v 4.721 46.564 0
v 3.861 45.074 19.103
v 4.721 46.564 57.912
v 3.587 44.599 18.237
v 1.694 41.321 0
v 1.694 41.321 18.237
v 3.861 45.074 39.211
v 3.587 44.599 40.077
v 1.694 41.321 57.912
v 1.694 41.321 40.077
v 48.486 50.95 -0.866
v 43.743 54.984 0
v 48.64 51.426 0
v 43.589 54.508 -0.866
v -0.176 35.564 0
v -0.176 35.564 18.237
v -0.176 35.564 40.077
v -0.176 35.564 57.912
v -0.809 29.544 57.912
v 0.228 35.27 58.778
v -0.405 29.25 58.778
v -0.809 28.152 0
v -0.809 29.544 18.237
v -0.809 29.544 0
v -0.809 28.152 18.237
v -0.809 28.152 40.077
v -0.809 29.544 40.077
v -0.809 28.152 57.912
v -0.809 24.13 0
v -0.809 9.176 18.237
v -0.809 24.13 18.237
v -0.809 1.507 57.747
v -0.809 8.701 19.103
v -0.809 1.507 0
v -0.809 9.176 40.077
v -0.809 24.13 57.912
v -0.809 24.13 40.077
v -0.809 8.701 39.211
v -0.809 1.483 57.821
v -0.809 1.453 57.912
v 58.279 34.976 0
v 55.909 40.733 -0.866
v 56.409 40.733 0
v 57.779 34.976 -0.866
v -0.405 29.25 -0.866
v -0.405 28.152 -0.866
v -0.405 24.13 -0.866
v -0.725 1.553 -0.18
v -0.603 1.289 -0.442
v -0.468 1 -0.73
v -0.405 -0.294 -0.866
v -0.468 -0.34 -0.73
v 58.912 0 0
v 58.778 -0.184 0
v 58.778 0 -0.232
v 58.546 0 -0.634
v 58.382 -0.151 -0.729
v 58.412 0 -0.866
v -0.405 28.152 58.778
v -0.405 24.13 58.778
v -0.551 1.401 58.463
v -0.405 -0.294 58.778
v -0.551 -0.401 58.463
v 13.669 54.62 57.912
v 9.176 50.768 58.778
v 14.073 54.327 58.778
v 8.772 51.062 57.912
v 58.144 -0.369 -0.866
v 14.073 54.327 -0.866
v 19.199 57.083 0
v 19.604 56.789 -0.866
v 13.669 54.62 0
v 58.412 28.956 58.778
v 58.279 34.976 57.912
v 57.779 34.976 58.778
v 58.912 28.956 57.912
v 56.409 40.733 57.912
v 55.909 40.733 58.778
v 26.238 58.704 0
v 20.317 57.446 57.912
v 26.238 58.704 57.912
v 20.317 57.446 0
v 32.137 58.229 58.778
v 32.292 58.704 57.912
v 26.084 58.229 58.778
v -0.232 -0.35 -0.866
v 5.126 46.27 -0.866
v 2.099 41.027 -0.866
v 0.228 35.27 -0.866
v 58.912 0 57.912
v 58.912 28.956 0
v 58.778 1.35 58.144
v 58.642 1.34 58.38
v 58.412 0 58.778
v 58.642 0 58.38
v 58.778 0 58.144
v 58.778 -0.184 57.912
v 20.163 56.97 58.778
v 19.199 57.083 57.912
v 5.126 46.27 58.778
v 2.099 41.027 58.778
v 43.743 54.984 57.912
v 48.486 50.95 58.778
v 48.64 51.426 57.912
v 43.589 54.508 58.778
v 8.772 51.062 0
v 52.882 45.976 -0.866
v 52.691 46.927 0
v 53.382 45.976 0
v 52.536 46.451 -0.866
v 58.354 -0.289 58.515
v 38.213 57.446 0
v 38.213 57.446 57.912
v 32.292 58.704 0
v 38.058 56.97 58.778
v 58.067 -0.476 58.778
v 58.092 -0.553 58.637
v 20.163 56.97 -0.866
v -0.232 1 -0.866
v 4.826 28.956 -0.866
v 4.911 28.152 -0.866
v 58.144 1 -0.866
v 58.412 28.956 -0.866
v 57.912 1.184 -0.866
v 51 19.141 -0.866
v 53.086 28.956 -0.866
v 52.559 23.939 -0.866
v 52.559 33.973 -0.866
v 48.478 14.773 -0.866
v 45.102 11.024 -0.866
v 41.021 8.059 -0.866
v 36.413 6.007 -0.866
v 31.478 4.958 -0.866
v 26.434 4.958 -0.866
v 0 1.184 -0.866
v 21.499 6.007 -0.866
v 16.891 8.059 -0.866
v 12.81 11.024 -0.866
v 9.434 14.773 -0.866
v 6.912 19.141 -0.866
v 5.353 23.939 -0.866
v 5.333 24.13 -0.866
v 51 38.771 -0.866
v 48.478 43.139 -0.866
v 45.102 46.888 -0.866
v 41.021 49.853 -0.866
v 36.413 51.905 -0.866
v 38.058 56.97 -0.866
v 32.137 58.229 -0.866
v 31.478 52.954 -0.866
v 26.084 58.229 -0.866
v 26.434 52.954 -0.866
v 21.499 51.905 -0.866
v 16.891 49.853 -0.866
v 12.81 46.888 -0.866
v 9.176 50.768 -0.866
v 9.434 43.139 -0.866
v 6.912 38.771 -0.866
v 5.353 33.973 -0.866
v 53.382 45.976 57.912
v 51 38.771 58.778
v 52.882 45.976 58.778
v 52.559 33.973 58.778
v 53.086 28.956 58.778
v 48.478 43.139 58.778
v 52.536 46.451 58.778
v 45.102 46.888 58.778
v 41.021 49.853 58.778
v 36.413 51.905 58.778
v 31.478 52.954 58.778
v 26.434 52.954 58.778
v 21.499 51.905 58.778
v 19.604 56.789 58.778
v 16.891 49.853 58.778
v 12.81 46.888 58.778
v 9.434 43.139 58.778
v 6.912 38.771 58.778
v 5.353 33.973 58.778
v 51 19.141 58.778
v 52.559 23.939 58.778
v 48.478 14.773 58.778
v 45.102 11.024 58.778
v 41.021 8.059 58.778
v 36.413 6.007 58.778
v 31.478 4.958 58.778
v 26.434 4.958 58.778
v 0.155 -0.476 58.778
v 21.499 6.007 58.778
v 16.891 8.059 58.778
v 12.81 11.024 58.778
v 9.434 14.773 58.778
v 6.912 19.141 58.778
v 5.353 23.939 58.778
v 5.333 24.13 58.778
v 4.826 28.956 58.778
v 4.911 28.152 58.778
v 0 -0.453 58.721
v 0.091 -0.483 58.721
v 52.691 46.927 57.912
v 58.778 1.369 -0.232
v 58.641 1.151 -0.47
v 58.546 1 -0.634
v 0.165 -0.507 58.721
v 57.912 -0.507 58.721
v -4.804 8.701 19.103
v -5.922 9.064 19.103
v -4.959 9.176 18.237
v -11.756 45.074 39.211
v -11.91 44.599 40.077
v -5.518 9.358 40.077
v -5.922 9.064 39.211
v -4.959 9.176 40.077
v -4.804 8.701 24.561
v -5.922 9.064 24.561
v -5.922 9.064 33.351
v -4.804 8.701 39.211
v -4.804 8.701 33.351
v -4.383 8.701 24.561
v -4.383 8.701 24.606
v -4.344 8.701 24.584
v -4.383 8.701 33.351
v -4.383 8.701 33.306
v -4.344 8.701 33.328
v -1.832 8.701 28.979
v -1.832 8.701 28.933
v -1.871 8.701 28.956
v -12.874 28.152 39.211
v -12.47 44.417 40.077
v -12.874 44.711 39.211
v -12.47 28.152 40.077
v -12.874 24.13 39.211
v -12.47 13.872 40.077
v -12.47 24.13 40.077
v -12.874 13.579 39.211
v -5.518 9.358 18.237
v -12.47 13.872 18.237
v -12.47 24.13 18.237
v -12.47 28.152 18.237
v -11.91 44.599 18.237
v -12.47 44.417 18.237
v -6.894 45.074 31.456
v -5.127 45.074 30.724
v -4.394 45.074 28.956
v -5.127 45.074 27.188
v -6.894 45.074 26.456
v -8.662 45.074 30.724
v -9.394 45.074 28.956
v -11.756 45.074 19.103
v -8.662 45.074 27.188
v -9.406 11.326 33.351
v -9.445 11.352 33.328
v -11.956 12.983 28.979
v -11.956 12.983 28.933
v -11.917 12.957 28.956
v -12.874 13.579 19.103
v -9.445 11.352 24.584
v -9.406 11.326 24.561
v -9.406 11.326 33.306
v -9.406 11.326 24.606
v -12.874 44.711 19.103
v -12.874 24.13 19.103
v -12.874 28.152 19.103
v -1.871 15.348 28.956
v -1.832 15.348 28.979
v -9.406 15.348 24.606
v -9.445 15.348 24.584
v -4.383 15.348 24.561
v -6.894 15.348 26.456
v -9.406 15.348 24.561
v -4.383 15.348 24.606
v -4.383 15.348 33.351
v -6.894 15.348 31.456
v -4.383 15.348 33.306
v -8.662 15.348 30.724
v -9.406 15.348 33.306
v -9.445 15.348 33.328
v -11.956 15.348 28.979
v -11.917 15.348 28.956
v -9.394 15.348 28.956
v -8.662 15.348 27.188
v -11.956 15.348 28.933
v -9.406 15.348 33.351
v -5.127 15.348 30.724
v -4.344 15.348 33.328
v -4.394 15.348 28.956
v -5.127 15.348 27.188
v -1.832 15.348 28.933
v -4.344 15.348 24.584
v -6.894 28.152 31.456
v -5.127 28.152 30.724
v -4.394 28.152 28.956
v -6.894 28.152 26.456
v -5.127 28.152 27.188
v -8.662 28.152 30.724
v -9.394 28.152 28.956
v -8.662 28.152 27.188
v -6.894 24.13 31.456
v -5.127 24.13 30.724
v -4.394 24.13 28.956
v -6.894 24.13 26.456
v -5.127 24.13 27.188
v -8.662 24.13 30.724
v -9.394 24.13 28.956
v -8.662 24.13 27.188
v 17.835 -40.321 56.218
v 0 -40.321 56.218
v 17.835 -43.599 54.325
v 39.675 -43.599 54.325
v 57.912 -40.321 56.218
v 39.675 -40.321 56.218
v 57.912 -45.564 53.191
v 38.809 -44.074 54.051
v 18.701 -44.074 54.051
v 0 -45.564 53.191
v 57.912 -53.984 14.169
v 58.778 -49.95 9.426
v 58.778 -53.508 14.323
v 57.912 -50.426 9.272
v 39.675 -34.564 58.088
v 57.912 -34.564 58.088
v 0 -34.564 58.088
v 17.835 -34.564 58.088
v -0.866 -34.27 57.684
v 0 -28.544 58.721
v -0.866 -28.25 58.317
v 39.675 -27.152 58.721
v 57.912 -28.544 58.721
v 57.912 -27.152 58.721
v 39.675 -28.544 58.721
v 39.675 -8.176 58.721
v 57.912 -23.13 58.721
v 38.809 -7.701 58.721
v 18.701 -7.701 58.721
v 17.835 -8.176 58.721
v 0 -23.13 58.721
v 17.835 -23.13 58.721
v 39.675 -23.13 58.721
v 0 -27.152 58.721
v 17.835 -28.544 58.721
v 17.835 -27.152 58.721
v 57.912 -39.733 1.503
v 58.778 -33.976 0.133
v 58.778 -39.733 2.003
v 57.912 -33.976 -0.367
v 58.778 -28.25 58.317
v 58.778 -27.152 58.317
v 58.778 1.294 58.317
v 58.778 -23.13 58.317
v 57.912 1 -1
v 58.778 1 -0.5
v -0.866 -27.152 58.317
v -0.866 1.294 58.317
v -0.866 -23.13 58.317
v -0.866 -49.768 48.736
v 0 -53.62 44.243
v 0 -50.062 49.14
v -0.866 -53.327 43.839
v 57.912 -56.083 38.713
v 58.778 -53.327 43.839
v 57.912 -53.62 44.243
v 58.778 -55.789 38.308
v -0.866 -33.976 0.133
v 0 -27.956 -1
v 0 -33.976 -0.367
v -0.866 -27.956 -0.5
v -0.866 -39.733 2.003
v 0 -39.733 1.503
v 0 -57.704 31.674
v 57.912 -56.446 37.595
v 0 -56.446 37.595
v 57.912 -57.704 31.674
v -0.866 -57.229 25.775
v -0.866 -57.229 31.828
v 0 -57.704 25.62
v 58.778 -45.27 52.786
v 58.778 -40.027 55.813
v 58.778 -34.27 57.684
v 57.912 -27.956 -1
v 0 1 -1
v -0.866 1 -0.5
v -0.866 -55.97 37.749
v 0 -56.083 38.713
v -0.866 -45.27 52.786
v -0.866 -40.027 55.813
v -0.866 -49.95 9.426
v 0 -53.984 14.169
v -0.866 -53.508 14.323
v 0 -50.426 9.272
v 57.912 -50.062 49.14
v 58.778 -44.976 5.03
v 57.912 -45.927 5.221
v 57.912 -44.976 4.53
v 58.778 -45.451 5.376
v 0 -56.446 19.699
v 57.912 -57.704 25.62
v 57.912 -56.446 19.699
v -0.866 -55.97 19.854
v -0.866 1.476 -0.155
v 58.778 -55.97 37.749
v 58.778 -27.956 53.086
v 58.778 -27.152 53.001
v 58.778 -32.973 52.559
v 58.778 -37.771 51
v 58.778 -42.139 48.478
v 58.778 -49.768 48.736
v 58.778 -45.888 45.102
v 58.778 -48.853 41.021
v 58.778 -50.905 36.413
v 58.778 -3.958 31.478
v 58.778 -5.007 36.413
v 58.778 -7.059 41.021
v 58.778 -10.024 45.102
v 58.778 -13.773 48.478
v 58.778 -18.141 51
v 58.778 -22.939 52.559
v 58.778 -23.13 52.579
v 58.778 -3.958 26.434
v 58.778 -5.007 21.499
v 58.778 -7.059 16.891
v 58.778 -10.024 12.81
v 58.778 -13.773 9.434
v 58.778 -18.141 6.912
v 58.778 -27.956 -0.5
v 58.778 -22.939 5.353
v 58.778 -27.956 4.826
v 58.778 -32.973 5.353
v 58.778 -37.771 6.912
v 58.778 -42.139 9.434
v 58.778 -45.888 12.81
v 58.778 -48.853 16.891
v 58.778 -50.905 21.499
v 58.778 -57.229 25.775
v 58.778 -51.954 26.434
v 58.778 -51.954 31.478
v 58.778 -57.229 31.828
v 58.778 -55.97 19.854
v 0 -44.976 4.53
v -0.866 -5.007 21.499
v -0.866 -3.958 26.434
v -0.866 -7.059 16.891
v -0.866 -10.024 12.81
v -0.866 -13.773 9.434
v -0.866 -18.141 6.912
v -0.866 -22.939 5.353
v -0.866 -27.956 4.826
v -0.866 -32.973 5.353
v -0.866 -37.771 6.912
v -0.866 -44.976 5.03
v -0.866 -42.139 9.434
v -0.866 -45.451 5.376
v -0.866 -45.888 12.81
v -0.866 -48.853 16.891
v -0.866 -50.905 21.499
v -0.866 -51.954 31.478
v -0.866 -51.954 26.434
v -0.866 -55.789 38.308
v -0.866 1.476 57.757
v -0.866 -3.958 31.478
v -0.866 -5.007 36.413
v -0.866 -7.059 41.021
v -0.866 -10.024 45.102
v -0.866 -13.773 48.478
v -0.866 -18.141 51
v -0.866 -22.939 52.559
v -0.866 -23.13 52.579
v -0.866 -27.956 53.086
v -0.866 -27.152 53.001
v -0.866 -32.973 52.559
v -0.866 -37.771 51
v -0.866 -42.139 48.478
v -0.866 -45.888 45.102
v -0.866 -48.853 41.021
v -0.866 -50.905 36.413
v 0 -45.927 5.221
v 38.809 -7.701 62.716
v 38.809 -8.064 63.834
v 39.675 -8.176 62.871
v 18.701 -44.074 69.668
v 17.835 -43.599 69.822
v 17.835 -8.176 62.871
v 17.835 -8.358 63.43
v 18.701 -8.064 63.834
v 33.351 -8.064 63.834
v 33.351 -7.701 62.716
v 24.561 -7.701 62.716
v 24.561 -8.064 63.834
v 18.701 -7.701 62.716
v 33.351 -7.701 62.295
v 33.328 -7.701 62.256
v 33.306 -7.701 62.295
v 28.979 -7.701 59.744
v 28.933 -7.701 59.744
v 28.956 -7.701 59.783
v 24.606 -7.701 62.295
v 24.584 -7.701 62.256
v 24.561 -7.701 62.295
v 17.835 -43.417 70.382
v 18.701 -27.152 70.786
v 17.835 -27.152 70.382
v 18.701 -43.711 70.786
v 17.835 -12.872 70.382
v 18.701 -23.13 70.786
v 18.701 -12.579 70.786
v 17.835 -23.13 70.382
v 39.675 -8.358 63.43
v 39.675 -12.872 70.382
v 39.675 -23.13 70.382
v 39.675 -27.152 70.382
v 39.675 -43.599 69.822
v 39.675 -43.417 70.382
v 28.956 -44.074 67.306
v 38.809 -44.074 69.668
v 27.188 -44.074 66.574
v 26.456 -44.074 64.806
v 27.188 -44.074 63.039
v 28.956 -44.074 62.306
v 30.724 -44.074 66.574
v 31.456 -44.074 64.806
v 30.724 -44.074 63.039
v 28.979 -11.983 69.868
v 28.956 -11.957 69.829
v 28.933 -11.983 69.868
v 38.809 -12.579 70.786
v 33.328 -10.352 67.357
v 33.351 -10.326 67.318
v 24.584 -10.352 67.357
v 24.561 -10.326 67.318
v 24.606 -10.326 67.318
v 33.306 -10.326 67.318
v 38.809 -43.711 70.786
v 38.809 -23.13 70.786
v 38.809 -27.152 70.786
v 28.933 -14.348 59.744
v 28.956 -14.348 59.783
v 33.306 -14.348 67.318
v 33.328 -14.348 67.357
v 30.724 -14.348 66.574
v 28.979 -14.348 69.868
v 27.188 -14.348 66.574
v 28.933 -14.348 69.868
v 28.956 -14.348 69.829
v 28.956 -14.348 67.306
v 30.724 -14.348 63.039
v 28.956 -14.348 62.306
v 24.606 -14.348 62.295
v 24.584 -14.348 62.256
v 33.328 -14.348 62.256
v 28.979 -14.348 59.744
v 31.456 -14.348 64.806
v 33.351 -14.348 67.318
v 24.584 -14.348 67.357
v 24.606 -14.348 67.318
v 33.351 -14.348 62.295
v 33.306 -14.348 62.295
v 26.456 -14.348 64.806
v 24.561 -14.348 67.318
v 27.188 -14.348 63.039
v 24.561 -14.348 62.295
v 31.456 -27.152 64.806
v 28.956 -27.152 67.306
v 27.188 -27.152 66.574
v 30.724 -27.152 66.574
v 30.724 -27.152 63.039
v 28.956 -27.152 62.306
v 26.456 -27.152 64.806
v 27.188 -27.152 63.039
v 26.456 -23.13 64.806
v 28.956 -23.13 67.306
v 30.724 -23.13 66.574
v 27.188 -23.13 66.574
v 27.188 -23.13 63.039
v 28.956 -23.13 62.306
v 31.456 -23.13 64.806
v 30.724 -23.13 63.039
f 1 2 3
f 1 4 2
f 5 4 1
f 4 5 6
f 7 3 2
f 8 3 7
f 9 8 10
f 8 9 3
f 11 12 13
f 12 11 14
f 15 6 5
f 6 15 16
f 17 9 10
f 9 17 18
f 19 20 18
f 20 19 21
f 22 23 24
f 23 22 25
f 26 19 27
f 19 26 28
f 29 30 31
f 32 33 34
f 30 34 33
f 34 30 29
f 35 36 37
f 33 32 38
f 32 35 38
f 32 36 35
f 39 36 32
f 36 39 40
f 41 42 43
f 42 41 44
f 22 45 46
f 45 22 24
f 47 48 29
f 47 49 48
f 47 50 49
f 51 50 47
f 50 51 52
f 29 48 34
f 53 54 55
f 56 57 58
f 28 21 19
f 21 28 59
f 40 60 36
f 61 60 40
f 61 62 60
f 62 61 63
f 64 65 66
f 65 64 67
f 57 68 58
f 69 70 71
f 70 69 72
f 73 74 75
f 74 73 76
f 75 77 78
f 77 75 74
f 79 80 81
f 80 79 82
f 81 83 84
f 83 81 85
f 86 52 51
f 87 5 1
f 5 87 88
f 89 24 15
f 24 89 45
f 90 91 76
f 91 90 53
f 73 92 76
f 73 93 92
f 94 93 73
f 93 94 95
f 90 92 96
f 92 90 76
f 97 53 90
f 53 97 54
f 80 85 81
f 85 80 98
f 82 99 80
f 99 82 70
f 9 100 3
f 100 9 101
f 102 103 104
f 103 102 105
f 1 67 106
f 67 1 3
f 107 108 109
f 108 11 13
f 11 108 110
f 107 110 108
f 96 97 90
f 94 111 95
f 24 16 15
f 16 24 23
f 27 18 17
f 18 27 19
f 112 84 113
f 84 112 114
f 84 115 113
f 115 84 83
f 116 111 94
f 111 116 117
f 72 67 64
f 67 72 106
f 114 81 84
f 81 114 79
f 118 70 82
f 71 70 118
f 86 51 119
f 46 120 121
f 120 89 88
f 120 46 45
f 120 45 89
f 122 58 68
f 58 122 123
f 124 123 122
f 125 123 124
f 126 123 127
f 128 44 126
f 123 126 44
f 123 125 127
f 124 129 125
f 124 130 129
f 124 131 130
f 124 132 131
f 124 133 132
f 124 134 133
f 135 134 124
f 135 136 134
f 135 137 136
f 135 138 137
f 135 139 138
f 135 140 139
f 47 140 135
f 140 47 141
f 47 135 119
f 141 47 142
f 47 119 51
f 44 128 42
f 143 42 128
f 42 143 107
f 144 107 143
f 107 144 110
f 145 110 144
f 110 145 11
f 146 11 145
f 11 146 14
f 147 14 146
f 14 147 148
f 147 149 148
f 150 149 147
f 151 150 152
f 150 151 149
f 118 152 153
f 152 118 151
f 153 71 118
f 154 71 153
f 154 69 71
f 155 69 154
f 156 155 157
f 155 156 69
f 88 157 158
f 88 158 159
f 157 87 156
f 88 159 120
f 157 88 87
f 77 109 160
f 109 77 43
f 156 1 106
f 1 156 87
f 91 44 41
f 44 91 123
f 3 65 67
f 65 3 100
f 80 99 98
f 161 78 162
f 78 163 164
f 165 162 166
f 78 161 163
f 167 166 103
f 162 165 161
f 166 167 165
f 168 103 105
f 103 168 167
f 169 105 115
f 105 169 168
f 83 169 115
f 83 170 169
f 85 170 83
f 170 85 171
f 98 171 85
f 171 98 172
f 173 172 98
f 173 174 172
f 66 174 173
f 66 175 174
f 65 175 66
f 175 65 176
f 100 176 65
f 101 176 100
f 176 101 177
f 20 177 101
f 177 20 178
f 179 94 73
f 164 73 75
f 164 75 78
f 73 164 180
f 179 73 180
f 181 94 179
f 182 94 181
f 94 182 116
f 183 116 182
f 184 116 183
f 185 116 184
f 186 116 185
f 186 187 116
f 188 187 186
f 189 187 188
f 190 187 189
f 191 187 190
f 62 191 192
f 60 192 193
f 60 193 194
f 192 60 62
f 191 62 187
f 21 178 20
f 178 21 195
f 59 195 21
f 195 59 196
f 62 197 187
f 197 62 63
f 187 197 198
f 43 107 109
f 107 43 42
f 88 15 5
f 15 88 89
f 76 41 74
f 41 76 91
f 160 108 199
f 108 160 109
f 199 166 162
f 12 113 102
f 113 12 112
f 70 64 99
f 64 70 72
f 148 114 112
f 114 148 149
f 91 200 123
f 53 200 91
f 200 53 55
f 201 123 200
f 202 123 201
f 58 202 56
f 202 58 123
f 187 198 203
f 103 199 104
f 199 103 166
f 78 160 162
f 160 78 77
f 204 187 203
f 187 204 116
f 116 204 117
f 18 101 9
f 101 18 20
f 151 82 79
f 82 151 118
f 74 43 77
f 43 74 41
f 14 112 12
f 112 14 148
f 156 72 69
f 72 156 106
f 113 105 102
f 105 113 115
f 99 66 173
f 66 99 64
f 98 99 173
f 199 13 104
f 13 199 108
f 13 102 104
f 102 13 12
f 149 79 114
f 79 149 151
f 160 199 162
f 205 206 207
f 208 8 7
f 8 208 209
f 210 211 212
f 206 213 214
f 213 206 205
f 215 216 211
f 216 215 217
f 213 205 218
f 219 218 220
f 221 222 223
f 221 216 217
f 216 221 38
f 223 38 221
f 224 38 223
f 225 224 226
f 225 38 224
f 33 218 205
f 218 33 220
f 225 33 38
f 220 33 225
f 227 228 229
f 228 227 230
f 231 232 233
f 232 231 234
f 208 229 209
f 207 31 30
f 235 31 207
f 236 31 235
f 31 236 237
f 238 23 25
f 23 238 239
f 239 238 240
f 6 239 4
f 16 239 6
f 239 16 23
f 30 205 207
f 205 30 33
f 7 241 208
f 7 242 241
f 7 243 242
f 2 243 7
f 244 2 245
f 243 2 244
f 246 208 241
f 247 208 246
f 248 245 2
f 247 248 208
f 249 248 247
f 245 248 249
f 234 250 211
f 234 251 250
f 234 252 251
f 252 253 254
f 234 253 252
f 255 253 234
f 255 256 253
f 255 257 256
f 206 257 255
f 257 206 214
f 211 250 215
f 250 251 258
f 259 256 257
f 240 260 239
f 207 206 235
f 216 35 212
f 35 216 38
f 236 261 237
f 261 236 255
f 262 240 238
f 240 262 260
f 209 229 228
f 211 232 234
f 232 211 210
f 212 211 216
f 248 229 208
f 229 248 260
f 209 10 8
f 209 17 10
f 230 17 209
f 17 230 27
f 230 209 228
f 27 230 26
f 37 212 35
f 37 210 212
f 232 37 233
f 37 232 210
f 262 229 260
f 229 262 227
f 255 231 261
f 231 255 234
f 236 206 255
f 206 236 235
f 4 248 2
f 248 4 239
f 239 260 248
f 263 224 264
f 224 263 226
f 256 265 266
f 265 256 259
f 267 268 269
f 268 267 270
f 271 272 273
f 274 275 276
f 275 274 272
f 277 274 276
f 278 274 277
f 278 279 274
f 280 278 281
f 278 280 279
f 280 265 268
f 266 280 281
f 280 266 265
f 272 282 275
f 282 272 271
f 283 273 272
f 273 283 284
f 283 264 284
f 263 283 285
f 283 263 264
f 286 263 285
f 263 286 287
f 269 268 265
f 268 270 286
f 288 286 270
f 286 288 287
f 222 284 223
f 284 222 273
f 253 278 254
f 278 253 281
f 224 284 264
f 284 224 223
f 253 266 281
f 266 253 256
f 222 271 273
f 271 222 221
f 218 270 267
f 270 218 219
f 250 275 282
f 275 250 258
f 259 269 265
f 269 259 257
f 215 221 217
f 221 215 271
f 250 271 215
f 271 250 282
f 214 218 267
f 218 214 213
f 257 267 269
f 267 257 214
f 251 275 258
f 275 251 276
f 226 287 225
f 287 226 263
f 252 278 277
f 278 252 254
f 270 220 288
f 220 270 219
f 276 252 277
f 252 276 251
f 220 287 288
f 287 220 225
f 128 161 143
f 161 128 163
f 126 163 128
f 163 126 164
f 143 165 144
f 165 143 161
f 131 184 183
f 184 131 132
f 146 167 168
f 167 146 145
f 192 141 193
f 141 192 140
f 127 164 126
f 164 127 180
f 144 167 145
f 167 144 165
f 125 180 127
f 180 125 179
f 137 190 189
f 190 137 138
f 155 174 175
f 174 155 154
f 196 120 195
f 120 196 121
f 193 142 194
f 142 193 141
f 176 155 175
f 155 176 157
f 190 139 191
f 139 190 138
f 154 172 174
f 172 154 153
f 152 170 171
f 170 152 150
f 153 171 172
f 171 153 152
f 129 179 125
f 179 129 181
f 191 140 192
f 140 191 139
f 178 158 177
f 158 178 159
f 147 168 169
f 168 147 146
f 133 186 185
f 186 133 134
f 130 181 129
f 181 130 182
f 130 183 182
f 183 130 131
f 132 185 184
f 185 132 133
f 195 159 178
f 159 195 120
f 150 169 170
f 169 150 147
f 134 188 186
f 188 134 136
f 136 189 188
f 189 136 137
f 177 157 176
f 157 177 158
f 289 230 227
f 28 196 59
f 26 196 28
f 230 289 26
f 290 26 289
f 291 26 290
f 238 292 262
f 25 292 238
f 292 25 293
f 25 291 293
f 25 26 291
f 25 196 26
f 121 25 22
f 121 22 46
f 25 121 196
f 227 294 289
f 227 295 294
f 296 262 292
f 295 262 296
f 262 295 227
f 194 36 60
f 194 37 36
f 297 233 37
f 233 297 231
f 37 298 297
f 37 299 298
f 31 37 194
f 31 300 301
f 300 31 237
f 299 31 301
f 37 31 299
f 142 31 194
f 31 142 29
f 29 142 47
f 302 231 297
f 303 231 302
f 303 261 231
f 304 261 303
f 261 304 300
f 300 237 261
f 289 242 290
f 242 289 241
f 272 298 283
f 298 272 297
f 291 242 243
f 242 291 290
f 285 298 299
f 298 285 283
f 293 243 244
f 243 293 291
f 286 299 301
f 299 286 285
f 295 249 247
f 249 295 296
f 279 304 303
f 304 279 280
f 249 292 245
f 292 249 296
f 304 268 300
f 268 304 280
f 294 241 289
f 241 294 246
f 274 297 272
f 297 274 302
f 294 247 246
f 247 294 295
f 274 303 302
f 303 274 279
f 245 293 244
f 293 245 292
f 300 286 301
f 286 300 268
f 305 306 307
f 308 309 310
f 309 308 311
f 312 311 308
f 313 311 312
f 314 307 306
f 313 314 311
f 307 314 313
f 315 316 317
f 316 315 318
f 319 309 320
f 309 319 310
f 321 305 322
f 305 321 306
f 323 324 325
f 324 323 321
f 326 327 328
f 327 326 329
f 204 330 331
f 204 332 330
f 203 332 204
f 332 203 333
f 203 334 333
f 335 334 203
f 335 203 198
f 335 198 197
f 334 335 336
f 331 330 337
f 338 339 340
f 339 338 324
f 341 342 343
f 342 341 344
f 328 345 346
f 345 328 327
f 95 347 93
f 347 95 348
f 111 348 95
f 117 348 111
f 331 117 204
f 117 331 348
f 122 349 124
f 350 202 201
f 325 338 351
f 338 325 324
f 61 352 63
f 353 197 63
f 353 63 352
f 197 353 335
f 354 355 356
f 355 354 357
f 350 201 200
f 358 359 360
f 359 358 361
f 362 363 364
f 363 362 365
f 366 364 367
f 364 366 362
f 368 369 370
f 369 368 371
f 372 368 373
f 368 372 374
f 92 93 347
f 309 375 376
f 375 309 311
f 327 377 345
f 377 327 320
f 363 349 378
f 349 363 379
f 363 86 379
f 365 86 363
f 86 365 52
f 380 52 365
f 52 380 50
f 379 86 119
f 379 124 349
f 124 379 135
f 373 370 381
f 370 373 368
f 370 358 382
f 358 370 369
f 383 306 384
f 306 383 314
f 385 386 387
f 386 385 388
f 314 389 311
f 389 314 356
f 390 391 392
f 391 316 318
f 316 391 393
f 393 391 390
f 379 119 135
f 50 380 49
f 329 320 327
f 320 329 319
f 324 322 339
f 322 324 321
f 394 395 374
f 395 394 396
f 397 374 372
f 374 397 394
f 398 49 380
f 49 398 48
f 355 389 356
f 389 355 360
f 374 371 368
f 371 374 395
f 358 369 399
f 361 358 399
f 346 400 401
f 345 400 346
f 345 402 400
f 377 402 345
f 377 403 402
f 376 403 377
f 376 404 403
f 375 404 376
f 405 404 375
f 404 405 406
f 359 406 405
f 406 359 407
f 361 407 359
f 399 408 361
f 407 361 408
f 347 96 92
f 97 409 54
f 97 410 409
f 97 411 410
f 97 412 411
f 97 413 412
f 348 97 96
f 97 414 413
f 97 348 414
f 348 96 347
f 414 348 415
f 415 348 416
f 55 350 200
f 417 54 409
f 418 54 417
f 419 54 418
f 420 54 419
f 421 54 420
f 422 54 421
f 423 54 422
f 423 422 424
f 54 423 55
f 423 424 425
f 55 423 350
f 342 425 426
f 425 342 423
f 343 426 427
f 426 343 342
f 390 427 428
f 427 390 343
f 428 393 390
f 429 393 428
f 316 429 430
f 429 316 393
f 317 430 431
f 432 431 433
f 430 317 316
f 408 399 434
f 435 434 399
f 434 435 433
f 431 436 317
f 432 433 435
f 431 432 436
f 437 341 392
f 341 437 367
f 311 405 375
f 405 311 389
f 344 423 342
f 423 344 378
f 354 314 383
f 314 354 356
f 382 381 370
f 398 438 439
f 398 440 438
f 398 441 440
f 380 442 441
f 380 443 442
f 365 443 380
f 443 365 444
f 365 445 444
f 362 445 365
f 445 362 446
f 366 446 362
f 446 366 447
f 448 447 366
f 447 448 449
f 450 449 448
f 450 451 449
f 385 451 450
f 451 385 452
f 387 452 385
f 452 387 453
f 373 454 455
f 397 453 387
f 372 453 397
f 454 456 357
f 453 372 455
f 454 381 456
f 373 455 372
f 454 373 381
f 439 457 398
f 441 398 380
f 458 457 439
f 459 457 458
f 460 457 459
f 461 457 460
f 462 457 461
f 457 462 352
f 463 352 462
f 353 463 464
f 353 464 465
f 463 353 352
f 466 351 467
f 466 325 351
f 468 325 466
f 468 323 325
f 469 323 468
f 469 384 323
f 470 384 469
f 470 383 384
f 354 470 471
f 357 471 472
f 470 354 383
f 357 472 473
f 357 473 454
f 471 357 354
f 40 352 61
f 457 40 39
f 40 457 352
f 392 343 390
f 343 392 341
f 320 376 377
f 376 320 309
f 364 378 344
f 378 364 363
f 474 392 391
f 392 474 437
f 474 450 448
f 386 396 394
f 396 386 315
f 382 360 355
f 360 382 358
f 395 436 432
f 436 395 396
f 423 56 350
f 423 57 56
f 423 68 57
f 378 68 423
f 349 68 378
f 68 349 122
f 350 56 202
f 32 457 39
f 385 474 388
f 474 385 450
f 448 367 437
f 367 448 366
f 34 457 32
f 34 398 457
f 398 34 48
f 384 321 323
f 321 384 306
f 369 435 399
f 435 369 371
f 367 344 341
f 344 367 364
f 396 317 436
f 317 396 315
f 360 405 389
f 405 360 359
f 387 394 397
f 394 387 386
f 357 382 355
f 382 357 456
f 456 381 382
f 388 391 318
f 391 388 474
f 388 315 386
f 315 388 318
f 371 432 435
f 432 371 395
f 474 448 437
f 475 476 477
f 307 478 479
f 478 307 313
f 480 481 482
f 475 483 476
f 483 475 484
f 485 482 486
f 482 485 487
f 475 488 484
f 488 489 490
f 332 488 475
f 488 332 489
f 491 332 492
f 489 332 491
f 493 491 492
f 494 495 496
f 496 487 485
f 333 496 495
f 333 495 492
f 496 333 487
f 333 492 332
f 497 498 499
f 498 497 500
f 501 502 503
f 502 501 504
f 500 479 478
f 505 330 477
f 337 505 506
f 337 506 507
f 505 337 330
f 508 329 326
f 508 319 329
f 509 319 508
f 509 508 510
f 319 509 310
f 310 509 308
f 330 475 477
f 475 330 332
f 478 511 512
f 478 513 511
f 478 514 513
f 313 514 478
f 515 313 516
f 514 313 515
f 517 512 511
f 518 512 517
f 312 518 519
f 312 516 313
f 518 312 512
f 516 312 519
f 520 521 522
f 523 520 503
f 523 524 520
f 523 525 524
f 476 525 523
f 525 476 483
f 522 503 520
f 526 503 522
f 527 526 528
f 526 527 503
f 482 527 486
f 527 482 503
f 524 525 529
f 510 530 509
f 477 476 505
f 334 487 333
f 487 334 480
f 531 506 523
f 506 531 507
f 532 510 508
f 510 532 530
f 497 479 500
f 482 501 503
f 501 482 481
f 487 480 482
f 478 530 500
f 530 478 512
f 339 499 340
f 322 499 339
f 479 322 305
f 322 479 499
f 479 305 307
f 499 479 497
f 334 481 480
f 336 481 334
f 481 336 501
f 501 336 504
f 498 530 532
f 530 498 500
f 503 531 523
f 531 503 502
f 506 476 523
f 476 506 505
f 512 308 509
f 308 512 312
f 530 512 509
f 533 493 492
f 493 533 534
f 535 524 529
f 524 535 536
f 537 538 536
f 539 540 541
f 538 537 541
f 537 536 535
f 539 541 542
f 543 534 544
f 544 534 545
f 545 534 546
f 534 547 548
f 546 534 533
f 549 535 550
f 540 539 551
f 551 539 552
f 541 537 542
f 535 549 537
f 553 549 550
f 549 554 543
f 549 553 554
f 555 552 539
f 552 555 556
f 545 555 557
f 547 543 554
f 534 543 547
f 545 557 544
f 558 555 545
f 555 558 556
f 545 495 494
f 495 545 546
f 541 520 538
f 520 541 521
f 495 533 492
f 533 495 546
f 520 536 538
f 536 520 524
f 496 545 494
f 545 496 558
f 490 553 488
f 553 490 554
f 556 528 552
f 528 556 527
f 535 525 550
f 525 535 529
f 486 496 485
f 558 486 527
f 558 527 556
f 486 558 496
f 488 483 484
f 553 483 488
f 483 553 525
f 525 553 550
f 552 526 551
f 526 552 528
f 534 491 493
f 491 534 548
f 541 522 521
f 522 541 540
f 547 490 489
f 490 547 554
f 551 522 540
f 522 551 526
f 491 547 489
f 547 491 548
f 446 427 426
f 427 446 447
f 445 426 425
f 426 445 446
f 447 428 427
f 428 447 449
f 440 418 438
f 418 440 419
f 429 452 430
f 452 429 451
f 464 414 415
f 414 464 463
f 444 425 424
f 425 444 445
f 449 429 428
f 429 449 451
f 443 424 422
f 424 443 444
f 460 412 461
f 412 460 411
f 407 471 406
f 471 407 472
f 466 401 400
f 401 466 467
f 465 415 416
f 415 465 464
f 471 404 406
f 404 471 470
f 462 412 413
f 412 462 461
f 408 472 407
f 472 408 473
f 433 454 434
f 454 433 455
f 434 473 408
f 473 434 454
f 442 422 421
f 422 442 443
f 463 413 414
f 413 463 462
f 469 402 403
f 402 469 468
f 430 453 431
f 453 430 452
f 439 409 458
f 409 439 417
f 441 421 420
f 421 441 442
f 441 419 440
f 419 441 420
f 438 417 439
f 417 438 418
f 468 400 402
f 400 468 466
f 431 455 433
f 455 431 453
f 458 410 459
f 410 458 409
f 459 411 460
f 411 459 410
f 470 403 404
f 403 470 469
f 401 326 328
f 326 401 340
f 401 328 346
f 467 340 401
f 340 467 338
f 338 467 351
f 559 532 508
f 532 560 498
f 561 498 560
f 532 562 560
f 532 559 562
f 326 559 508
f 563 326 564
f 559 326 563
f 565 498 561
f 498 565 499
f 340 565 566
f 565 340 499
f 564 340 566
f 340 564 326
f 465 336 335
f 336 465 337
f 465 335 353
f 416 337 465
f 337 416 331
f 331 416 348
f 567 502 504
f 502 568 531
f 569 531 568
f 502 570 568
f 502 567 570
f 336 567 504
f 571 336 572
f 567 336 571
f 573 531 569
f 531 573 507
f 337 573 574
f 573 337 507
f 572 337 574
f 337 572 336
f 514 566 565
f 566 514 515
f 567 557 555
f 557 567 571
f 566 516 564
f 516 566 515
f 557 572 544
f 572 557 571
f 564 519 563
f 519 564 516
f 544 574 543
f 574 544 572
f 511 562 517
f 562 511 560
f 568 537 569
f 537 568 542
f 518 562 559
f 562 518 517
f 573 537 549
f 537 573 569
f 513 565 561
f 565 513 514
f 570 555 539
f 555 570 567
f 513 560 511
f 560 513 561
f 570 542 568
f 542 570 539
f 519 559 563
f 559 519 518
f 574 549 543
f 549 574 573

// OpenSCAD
//M. Haris Usmani
//http://harisusmani.com

//All Units are in mm, Import as STL with Unit=mm

/* [Main Settings] */
//Radius of Pipe in Inches (Schedule 40)
R=1.9; //[2.375:2"PVC,1.9:1-1/2"PVC,1.660:1-1/4"PVC,1.315:1"PVC]

//Space for Tightening
T=3; //[0:5]

//Nut Size
M=5; //[4,5,6]

/////////////////////////////////////////////////////////////////////////////
R_mm=R*25.4; //Converted to mm!
//Strength of Clamp (Fixed)
S=1.2; // [1.2] Determines Strength of Clamp in Percentage-FIXED!

/////////////////////////////////////////////////////////////////////////////
//Hexagonal Module from shapes.scad, http://svn.clifford.at/openscad/trunk/libraries/shapes.scad by Catarina Mota
module hexagon(size, height) {
  boxWidth = size/1.75;
  for (r = [-60, 0, 60]) rotate([0,0,r]) cube([boxWidth, size, height], true);
}
/////////////////////////////////////////////////////////////////////////////

//Pipe Model for Visualization
//translate([R_mm*S/2,R_mm*S/2,-R_mm*6]) cylinder(R_mm*10,R_mm/2,R_mm/2);

union()//Main Duplication
{

difference() //Pipe Hole
{
union()
{
minkowski() //Fillet
{
	union()
	{
		cube([R_mm*S,R_mm/2*S, R_mm*S]); //Main Body
		translate([R_mm*S/2,R_mm*S/2,0]) cylinder(R_mm*S,R_mm*S/2,R_mm*S/2); //Curved Edge
	}
	sphere([R_mm/2,R_mm,R_mm*5/12]); //Fillet Object
}

minkowski() //Fillet
{
	difference() //Hard Chamfer
	{
		translate([-R_mm/4,R_mm/5,(R_mm/2)-(R_mm*5/48)]) cube([R_mm/2,R_mm/1.4,R_mm*5/12]);
		translate([-R_mm,-R_mm*7/17,(R_mm/2)-(R_mm*5/24)]) rotate([0,0,-33]) cube([R_mm/2,R_mm,2*R_mm*5/12]);
	}
	sphere([R_mm/2,R_mm,R_mm*5/12]); //Fillet Object
}
}
	union()
	{
		translate([R_mm*S/2,R_mm*S/2,-R_mm*6]) cylinder(R_mm*10,R_mm/2,R_mm/2);//Pipe
		translate([-R_mm,R_mm*S*5/12,-R_mm]) cube([R_mm*2,R_mm/(15-T),R_mm*4]);//Tightning Space
		translate([-R_mm/7,R_mm*2,(R_mm*S/2)]) rotate([90,0,0]) cylinder((R_mm*4),M/2,M/2); //Screw Space
		if (M==4) translate([-R_mm/7,-R_mm*0.2,(R_mm*S/2)]) rotate([90,0,0]) hexagon(7.66,50); //NUTS
		if (M==5) translate([-R_mm/7,-R_mm*0.2,(R_mm*S/2)]) rotate([90,0,0]) hexagon(8.79,50);
		if (M==6) translate([-R_mm/7,-R_mm*0.2,(R_mm*S/2)]) rotate([90,0,0]) hexagon(11.05,50);
	}
} //Single Side ENDS

}

{

translate([R_mm*S,1,R_mm*S]) rotate([180,90,0]) //Main Translation

//COPY SIDE HERE
difference() //Pipe Hole
{
union()
{
minkowski() //Fillet
{
	union()
	{
		cube([R_mm*S,R_mm/2*S, R_mm*S]); //Main Body
		translate([R_mm*S/2,R_mm*S/2,0]) cylinder(R_mm*S,R_mm*S/2,R_mm*S/2); //Curved Edge
	}
	sphere([R_mm/2,R_mm,R_mm*5/12]); //Fillet Object
}

minkowski() //Fillet
{
	difference() //Hard Chamfer
	{
		translate([-R_mm/4,R_mm/5,(R_mm/2)-(R_mm*5/48)]) cube([R_mm/2,R_mm/1.4,R_mm*5/12]);
		translate([-R_mm,-R_mm*7/17,(R_mm/2)-(R_mm*5/24)]) rotate([0,0,-33]) cube([R_mm/2,R_mm,2*R_mm*5/12]);
	}
	sphere([R_mm/2,R_mm,R_mm*5/12]); //Fillet Object
}
}
	union()
	{
		translate([R_mm*S/2,R_mm*S/2,-R_mm*6]) cylinder(R_mm*10,R_mm/2,R_mm/2);//Pipe
		translate([-R_mm,R_mm*S*5/12,-R_mm]) cube([R_mm*2,R_mm/(15-T),R_mm*4]);//Tightning Space
		translate([-R_mm/7,R_mm*2,(R_mm*S/2)]) rotate([90,0,0]) cylinder((R_mm*4),M/2,M/2); //Screw Space
		if (M==4) translate([-R_mm/7,-R_mm*0.2,(R_mm*S/2)]) rotate([90,0,0]) hexagon(7.66,50); //NUTS
		if (M==5) translate([-R_mm/7,-R_mm*0.2,(R_mm*S/2)]) rotate([90,0,0]) hexagon(8.79,50);
		if (M==6) translate([-R_mm/7,-R_mm*0.2,(R_mm*S/2)]) rotate([90,0,0]) hexagon(11.05,50);
	}
}
///////////////
}

//preview[view: north, tilt: top];
